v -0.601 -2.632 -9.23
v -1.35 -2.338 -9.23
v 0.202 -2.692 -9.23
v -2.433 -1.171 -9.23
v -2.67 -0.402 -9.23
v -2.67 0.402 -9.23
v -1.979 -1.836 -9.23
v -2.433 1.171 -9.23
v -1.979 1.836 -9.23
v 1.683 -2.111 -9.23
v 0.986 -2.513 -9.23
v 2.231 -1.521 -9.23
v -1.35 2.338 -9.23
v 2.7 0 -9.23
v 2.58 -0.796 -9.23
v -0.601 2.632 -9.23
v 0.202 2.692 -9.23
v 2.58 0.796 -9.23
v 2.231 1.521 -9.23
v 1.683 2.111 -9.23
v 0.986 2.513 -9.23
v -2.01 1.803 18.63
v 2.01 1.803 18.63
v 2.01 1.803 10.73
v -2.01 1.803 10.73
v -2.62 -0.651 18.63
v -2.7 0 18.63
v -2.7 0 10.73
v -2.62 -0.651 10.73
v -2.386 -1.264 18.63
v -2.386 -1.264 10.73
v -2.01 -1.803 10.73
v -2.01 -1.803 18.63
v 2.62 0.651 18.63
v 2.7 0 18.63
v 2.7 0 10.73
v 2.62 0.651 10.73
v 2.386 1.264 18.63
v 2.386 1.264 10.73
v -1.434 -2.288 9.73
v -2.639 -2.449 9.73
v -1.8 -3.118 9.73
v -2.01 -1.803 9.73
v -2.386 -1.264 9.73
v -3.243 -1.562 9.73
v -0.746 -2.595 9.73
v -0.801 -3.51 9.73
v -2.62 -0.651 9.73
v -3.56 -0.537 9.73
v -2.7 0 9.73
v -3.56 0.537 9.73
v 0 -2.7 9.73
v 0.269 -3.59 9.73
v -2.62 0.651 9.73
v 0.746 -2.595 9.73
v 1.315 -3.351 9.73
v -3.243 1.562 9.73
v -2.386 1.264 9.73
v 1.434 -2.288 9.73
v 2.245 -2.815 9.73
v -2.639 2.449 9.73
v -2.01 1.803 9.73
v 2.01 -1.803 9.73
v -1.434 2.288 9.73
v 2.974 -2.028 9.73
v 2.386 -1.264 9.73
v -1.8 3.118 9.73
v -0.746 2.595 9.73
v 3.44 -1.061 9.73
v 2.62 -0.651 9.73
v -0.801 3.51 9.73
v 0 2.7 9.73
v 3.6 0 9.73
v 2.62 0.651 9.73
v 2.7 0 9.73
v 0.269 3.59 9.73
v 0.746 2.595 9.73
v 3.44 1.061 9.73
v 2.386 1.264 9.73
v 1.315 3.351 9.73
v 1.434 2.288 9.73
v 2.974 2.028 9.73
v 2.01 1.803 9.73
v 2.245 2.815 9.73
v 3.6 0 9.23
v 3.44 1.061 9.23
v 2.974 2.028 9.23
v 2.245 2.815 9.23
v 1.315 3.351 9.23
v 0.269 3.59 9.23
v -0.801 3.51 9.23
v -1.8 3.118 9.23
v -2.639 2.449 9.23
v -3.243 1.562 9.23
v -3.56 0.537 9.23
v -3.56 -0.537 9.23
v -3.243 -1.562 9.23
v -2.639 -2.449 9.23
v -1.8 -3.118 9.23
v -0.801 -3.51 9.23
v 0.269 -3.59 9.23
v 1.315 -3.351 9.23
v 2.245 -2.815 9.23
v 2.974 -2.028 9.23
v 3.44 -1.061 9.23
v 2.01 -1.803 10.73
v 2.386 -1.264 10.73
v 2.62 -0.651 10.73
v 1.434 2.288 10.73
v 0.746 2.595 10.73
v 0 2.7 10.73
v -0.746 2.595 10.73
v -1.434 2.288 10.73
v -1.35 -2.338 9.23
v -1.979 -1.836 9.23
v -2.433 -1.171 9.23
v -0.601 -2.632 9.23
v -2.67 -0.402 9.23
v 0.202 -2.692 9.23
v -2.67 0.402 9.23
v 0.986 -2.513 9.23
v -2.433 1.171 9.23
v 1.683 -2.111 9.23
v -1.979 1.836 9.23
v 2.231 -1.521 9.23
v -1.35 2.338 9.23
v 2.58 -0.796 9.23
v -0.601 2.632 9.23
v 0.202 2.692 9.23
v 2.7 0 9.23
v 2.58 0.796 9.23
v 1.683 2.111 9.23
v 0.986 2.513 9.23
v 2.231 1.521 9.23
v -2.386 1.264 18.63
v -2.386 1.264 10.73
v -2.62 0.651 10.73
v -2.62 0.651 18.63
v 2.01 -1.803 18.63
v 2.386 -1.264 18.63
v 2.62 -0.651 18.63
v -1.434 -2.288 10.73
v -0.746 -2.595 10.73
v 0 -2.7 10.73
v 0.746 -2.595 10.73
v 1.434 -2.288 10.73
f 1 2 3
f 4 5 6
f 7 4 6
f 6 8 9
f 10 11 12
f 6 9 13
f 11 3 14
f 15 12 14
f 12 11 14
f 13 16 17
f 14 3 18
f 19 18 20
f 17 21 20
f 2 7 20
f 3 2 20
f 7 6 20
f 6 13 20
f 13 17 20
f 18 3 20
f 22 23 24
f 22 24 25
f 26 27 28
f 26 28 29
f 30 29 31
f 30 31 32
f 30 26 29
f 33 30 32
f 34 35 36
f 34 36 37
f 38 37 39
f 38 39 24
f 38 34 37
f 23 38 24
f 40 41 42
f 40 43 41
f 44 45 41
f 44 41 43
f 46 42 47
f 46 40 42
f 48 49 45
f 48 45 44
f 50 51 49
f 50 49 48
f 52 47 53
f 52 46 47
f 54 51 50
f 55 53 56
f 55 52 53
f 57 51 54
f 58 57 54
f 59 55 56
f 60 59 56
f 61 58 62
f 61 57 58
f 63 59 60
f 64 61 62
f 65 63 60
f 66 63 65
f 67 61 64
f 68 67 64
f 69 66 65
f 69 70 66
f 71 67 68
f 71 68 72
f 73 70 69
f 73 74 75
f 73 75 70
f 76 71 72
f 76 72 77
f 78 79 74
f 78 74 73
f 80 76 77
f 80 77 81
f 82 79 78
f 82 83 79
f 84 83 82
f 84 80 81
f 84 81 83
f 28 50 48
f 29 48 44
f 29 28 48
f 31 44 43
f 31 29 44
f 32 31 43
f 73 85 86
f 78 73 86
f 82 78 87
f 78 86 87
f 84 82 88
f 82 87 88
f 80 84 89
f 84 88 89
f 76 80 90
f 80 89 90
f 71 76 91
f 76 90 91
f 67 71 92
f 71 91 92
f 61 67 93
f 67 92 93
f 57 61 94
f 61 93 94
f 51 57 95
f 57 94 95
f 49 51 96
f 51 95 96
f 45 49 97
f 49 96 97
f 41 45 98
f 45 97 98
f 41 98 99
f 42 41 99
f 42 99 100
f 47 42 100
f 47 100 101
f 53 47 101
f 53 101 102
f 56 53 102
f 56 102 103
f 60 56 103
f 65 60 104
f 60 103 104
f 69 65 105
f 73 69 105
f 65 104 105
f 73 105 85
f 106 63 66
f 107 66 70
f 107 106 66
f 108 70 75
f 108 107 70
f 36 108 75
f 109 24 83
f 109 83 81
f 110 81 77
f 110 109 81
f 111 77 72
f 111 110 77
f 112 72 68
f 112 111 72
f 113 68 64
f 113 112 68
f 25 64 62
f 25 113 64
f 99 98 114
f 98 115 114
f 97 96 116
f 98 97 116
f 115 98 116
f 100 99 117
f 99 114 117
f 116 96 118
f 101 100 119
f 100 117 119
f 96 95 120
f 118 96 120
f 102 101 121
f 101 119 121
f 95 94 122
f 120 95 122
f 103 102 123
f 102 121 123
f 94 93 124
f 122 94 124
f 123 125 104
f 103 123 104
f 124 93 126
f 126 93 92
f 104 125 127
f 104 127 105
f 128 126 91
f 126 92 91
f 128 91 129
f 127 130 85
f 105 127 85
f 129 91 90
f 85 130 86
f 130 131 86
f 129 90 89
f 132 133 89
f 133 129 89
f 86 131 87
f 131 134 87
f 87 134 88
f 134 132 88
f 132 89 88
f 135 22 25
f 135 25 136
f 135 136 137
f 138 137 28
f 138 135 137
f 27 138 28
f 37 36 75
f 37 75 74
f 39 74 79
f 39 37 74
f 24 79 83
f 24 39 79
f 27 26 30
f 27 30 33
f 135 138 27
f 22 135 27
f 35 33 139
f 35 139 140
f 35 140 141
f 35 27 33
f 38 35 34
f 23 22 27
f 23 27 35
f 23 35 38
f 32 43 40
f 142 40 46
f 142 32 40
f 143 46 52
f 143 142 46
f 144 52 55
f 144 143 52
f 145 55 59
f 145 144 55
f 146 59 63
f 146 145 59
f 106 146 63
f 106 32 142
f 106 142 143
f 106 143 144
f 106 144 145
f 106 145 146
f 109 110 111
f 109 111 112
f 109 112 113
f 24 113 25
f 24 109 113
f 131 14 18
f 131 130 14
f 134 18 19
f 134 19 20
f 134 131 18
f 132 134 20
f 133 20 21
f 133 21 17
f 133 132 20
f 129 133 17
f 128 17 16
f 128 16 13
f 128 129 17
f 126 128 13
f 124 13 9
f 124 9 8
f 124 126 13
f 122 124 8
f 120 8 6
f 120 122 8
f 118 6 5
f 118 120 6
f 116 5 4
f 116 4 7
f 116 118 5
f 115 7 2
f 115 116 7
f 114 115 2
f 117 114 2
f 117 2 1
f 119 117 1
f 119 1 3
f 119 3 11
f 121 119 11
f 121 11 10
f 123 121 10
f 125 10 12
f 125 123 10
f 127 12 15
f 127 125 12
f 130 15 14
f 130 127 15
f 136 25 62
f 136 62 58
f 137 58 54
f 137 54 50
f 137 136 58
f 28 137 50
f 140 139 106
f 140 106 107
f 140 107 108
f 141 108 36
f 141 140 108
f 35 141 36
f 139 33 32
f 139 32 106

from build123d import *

# Parameters (mm, degrees)
SKETCH1_R           = 2.7
BOSS_EXTRUDE1_DEPTH = 9.23
SKETCH2_R           = 3.6
BOSS_EXTRUDE2_DEPTH = 0.5
BOSS_EXTRUDE3_START = 1
SKETCH3_R           = 2.7
BOSS_EXTRUDE3_DEPTH = 1
BOSS_EXTRUDE4_START = 8.9
BOSS_EXTRUDE4_DEPTH = 8.9


with BuildPart() as part:
    # Sketch1 → Boss-Extrude1 (new, symmetric)
    with BuildSketch(Plane.XY):
        Circle(SKETCH1_R)
    extrude(amount=BOSS_EXTRUDE1_DEPTH, both=True)

    # Sketch2 → Boss-Extrude2 (add)
    with BuildSketch(Plane.XY.offset(9.23)):
        Circle(SKETCH2_R)
    extrude(amount=BOSS_EXTRUDE2_DEPTH)

    # Sketch3 → Boss-Extrude3 (add)
    with BuildSketch(Plane.XY.offset(9.73).offset(BOSS_EXTRUDE3_START)):
        Circle(SKETCH3_R)
    extrude(amount=-BOSS_EXTRUDE3_DEPTH)

    # Sketch3<3> → Boss-Extrude4 (add)
    with BuildSketch(Plane.XY.offset(9.73).offset(BOSS_EXTRUDE4_START)):
        with BuildLine():
            ThreePointArc((-2.01, 1.802747903), (-2.7, 0), (-2.01, -1.802747903))
            Line((-2.01, -1.802747903), (2.01, -1.802747903))
            ThreePointArc((2.01, -1.802747903), (2.7, 0), (2.01, 1.802747903))
            Line((2.01, 1.802747903), (-2.01, 1.802747903))
        make_face()
    extrude(amount=-BOSS_EXTRUDE4_DEPTH)


solid = part.part
